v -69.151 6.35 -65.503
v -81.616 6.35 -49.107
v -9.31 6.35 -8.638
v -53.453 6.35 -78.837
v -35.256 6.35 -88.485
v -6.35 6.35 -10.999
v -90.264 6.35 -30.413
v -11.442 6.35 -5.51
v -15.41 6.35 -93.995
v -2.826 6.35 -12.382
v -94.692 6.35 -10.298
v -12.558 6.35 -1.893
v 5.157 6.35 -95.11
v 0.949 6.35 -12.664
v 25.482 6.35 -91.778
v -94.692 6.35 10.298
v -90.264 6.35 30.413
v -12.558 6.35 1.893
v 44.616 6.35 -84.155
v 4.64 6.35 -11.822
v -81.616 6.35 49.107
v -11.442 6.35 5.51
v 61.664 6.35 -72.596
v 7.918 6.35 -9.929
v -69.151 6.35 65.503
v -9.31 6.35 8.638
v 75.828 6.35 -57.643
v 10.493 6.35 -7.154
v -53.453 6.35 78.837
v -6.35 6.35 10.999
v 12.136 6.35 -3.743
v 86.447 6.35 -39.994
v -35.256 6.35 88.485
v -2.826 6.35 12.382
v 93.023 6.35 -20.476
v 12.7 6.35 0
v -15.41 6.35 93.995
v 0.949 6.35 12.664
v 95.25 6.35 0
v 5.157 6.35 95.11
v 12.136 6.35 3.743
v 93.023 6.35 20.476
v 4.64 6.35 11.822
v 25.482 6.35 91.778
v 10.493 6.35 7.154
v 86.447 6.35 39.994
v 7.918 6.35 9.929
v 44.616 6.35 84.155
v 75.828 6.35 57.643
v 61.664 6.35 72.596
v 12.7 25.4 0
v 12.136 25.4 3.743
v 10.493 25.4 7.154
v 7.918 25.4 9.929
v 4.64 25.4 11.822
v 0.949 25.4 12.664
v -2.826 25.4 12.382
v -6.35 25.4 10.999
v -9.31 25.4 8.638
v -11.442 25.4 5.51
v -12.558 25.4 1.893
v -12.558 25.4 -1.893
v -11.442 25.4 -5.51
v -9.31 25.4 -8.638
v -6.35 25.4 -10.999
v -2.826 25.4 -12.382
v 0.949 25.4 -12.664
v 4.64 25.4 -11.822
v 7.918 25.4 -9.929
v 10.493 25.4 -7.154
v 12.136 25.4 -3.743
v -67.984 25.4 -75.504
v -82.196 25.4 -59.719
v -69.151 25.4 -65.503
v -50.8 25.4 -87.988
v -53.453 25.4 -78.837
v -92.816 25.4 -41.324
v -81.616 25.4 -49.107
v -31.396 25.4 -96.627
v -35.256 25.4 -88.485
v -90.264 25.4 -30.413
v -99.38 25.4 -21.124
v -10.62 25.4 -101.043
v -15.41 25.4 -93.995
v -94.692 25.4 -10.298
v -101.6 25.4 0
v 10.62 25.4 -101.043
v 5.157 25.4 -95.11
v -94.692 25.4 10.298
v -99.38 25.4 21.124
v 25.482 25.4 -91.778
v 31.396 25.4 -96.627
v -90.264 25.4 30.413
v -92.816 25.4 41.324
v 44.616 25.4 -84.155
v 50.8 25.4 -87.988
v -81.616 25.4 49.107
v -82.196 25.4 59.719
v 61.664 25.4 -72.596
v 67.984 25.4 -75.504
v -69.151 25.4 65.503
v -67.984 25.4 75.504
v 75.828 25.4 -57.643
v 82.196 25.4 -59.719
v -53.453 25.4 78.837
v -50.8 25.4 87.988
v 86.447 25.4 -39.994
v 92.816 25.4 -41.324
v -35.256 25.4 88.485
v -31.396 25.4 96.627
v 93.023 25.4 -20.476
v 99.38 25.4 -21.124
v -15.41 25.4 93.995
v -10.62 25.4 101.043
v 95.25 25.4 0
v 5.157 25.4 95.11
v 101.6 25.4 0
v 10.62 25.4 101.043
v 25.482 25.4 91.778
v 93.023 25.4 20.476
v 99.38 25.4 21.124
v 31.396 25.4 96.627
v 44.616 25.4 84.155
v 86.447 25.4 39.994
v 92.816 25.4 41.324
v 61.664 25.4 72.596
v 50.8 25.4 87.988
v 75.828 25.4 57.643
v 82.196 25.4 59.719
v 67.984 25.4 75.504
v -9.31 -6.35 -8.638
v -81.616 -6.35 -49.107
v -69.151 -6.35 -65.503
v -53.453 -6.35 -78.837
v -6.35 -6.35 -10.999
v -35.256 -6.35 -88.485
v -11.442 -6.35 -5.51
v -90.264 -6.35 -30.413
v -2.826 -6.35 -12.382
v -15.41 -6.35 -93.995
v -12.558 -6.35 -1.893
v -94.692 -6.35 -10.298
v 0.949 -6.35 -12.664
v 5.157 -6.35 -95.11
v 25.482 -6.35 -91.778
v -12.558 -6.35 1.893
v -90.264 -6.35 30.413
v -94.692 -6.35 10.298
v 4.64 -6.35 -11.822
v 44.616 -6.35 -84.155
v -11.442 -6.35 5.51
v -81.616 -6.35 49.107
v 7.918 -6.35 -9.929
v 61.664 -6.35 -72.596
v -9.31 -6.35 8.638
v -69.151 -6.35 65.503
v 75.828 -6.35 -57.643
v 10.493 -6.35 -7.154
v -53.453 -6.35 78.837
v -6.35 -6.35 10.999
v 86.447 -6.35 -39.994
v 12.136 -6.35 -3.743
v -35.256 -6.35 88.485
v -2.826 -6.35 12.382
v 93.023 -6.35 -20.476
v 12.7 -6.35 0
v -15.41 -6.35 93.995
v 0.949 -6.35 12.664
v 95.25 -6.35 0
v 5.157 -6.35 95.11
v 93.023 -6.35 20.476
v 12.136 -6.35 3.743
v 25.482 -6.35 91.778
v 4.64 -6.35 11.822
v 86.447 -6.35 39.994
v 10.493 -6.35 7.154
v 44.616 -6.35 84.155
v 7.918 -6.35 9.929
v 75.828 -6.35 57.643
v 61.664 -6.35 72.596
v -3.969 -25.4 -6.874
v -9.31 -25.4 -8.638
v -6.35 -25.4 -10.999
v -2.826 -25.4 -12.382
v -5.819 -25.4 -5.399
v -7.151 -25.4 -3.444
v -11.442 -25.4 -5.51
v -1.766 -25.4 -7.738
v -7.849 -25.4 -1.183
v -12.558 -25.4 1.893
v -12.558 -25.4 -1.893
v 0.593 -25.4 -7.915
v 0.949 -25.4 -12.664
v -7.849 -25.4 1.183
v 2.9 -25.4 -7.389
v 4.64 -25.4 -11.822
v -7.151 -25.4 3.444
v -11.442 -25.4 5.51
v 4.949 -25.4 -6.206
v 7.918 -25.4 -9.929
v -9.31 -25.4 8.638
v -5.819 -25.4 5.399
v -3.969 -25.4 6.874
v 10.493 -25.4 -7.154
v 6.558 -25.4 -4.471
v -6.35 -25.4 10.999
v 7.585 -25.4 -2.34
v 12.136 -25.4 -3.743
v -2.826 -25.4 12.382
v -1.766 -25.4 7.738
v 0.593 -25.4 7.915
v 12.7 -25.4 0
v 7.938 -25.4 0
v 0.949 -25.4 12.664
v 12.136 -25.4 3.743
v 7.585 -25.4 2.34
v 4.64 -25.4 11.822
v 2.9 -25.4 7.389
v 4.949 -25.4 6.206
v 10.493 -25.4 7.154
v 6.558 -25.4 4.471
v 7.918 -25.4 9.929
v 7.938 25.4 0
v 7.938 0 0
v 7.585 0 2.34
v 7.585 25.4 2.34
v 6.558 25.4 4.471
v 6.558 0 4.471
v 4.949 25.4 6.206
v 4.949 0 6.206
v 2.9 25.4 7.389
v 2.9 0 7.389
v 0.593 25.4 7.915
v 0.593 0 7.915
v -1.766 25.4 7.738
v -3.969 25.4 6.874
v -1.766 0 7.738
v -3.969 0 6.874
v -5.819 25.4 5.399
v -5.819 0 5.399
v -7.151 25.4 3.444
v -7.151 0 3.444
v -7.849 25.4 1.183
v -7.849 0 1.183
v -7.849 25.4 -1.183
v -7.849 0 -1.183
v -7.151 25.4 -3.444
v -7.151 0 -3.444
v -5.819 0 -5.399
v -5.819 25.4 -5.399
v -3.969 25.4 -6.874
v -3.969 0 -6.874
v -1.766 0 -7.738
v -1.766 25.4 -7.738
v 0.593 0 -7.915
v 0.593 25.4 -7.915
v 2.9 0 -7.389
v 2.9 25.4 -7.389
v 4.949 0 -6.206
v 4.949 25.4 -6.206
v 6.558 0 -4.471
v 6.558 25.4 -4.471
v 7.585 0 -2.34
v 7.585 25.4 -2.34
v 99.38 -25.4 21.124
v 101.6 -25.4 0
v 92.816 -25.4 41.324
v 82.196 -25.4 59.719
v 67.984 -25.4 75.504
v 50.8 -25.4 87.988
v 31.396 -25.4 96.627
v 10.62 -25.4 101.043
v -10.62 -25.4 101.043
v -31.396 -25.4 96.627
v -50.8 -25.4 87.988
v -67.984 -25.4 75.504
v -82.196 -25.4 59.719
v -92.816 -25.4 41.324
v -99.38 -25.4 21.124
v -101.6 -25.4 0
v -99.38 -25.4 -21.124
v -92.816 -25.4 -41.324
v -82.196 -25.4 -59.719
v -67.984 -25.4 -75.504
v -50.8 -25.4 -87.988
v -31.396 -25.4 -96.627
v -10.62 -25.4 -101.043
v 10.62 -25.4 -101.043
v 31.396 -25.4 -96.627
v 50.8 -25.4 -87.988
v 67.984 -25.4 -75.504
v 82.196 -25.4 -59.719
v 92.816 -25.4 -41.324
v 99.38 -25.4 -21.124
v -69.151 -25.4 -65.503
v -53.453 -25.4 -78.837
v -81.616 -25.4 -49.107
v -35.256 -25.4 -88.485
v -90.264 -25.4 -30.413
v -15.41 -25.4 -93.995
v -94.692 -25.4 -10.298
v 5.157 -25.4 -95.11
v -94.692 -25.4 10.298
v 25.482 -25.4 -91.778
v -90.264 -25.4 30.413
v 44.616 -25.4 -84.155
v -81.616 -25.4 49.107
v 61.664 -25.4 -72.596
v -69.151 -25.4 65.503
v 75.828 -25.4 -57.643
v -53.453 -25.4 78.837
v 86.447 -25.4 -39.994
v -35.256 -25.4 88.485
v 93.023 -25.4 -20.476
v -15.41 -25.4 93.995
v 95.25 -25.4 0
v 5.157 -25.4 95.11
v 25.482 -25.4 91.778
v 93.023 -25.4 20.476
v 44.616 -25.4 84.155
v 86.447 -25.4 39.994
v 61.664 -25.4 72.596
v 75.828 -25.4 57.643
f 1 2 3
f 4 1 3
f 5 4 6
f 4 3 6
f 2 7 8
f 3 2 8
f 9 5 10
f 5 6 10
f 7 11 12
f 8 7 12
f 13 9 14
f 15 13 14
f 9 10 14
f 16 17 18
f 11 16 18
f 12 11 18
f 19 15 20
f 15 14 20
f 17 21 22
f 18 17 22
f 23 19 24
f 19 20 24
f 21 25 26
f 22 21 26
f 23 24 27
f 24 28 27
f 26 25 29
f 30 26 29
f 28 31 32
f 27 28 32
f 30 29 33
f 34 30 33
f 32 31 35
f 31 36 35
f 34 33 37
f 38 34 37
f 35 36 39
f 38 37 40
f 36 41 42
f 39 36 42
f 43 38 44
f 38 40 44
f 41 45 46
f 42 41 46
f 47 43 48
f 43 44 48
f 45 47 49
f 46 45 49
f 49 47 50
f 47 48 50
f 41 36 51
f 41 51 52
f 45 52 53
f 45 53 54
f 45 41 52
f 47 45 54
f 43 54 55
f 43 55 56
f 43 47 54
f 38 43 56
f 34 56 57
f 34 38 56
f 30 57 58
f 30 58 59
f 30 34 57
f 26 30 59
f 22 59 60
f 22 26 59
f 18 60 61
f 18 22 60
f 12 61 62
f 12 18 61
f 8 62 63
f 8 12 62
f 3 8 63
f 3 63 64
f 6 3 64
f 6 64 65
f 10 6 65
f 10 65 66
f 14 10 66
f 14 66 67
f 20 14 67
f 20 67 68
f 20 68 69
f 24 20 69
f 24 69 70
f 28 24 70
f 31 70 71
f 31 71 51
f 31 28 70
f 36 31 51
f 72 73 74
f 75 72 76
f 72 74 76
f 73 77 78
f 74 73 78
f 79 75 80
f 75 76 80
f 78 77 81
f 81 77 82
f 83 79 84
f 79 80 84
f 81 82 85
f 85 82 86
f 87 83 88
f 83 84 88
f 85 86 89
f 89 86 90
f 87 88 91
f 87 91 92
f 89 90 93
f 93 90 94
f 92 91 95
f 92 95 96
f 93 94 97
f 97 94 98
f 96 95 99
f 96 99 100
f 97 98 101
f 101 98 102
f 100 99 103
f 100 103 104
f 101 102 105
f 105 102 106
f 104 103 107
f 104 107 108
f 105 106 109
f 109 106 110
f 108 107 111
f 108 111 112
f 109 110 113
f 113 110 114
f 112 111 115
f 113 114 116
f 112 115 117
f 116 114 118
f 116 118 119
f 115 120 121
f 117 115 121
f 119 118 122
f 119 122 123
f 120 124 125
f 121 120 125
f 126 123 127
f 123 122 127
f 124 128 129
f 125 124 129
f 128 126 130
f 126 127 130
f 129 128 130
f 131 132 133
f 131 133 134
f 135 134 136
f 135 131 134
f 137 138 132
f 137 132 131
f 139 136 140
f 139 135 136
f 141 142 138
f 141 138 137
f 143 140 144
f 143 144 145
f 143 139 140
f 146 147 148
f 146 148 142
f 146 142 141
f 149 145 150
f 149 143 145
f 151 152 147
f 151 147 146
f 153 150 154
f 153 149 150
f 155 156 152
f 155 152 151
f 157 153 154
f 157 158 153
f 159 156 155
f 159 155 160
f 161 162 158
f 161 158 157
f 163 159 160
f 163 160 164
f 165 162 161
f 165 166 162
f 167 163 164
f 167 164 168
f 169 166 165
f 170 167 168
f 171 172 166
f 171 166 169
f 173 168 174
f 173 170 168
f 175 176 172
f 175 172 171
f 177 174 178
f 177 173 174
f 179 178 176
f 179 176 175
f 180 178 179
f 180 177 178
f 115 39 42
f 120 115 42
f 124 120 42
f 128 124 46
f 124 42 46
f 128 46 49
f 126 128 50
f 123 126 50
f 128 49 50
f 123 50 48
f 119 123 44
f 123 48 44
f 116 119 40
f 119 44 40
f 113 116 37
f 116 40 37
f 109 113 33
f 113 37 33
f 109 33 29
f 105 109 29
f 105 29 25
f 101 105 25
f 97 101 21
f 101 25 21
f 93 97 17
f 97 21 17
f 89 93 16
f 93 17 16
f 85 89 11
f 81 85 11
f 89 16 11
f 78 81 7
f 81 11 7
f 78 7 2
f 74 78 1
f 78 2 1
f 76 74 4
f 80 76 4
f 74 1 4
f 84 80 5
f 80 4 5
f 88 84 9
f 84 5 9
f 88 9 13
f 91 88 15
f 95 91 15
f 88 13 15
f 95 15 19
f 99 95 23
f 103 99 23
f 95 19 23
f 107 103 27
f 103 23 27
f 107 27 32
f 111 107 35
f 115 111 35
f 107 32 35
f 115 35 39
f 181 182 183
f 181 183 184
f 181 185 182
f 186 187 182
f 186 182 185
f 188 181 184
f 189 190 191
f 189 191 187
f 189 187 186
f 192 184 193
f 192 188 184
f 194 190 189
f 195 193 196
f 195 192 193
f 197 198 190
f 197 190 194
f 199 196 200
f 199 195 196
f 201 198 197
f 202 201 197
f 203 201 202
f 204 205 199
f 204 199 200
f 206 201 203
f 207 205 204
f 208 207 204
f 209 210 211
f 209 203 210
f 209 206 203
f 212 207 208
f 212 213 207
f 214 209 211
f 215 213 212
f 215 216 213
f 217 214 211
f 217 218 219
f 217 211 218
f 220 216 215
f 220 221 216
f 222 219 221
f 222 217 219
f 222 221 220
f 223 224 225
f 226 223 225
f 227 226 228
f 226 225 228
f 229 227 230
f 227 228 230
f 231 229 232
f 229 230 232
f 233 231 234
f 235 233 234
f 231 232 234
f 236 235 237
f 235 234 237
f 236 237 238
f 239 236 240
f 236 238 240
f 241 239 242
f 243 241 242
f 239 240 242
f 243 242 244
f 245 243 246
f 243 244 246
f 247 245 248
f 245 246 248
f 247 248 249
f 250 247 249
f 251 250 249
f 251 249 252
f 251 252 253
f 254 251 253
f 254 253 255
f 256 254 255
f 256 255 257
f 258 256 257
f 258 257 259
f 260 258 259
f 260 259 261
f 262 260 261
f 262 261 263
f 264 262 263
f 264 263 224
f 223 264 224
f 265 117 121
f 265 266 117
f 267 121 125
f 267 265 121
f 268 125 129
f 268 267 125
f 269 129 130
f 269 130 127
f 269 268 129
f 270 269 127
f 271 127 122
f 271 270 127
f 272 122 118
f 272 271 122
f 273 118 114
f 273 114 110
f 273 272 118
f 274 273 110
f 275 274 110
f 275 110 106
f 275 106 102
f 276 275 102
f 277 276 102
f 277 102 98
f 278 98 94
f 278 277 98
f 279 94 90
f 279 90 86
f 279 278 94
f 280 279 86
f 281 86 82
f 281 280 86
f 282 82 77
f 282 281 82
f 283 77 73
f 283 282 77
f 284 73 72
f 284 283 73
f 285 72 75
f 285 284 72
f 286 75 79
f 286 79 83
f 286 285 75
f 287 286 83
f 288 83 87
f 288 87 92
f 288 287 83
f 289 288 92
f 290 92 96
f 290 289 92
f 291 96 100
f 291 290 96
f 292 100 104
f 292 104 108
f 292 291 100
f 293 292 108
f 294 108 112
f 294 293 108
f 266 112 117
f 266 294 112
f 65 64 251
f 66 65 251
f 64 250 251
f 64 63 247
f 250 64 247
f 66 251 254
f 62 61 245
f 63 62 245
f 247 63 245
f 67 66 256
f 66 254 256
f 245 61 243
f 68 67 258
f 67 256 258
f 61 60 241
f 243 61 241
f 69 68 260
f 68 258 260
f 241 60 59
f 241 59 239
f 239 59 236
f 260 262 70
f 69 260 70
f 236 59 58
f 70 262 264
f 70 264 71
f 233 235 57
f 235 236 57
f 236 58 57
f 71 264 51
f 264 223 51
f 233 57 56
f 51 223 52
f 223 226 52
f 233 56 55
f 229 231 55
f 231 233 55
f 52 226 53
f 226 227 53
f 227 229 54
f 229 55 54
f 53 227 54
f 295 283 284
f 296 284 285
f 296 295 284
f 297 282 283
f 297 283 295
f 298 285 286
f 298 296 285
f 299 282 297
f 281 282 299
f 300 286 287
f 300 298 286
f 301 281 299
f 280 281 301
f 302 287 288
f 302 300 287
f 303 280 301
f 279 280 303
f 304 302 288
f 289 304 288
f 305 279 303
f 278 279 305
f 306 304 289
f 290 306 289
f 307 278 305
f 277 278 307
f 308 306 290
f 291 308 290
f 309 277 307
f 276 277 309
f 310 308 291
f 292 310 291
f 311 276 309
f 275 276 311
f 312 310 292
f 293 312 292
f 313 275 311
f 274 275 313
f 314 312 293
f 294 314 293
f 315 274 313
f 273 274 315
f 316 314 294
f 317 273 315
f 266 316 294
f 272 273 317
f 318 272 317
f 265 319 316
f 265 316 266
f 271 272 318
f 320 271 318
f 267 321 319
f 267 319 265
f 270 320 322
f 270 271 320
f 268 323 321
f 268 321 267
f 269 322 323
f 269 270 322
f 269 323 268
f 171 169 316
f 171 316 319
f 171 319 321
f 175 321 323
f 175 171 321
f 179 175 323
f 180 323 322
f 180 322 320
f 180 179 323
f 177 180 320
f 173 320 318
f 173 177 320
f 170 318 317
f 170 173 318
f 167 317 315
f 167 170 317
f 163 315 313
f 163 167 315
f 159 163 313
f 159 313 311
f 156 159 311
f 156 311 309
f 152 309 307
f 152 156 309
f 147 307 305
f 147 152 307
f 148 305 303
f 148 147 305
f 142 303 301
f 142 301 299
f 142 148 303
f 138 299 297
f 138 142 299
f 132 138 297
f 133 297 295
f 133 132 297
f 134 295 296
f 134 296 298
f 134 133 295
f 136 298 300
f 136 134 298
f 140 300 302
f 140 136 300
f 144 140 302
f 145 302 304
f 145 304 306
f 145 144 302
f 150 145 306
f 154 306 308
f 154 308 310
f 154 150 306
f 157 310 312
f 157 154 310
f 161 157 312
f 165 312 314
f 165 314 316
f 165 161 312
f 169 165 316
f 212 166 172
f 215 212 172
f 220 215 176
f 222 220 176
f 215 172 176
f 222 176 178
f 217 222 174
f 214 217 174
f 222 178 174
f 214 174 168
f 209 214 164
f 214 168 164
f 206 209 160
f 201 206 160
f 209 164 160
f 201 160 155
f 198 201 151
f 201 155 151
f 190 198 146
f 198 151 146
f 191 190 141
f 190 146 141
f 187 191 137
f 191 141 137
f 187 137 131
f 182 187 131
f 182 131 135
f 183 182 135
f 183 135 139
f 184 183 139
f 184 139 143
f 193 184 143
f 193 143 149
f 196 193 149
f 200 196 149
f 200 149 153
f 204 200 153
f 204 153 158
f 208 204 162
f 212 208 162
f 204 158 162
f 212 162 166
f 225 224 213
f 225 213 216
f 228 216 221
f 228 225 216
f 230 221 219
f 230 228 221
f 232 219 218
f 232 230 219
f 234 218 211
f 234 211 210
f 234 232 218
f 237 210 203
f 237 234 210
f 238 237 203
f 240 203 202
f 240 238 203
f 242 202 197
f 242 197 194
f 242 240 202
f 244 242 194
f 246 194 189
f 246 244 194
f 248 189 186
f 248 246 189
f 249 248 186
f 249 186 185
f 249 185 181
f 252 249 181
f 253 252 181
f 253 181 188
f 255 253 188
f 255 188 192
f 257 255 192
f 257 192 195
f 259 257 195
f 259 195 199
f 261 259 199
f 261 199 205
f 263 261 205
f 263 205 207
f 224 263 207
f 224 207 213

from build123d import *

# Parameters (mm, degrees)
F0_R     = 101.6
F0_R_2   = 7.9375
F1_DEPTH = 6.35
F2_R     = 101.6
F2_R_2   = 95.25
F2_R_3   = 12.7
F2_R_4   = 7.9375
F3_DEPTH = 19.05


with BuildPart() as f1:
    # F0 (on Front) → F1 (new body)
    with BuildSketch(Plane.XZ):
        Circle(F0_R)
        Circle(F0_R_2, mode=Mode.SUBTRACT)
    extrude(amount=F1_DEPTH)

    # F2 (on face) → F3 (join)
    with BuildSketch(Plane.XZ.offset(6.35)):
        Circle(F2_R)
        Circle(F2_R_2, mode=Mode.SUBTRACT)
        Circle(F2_R_3)
        Circle(F2_R_4, mode=Mode.SUBTRACT)
    extrude(amount=F3_DEPTH)

    # F4: F1 across plane


with BuildPart() as f1_1:
    add(f1.part)
    add(f1.part.mirror(Plane.XZ))


solid = f1_1.part
